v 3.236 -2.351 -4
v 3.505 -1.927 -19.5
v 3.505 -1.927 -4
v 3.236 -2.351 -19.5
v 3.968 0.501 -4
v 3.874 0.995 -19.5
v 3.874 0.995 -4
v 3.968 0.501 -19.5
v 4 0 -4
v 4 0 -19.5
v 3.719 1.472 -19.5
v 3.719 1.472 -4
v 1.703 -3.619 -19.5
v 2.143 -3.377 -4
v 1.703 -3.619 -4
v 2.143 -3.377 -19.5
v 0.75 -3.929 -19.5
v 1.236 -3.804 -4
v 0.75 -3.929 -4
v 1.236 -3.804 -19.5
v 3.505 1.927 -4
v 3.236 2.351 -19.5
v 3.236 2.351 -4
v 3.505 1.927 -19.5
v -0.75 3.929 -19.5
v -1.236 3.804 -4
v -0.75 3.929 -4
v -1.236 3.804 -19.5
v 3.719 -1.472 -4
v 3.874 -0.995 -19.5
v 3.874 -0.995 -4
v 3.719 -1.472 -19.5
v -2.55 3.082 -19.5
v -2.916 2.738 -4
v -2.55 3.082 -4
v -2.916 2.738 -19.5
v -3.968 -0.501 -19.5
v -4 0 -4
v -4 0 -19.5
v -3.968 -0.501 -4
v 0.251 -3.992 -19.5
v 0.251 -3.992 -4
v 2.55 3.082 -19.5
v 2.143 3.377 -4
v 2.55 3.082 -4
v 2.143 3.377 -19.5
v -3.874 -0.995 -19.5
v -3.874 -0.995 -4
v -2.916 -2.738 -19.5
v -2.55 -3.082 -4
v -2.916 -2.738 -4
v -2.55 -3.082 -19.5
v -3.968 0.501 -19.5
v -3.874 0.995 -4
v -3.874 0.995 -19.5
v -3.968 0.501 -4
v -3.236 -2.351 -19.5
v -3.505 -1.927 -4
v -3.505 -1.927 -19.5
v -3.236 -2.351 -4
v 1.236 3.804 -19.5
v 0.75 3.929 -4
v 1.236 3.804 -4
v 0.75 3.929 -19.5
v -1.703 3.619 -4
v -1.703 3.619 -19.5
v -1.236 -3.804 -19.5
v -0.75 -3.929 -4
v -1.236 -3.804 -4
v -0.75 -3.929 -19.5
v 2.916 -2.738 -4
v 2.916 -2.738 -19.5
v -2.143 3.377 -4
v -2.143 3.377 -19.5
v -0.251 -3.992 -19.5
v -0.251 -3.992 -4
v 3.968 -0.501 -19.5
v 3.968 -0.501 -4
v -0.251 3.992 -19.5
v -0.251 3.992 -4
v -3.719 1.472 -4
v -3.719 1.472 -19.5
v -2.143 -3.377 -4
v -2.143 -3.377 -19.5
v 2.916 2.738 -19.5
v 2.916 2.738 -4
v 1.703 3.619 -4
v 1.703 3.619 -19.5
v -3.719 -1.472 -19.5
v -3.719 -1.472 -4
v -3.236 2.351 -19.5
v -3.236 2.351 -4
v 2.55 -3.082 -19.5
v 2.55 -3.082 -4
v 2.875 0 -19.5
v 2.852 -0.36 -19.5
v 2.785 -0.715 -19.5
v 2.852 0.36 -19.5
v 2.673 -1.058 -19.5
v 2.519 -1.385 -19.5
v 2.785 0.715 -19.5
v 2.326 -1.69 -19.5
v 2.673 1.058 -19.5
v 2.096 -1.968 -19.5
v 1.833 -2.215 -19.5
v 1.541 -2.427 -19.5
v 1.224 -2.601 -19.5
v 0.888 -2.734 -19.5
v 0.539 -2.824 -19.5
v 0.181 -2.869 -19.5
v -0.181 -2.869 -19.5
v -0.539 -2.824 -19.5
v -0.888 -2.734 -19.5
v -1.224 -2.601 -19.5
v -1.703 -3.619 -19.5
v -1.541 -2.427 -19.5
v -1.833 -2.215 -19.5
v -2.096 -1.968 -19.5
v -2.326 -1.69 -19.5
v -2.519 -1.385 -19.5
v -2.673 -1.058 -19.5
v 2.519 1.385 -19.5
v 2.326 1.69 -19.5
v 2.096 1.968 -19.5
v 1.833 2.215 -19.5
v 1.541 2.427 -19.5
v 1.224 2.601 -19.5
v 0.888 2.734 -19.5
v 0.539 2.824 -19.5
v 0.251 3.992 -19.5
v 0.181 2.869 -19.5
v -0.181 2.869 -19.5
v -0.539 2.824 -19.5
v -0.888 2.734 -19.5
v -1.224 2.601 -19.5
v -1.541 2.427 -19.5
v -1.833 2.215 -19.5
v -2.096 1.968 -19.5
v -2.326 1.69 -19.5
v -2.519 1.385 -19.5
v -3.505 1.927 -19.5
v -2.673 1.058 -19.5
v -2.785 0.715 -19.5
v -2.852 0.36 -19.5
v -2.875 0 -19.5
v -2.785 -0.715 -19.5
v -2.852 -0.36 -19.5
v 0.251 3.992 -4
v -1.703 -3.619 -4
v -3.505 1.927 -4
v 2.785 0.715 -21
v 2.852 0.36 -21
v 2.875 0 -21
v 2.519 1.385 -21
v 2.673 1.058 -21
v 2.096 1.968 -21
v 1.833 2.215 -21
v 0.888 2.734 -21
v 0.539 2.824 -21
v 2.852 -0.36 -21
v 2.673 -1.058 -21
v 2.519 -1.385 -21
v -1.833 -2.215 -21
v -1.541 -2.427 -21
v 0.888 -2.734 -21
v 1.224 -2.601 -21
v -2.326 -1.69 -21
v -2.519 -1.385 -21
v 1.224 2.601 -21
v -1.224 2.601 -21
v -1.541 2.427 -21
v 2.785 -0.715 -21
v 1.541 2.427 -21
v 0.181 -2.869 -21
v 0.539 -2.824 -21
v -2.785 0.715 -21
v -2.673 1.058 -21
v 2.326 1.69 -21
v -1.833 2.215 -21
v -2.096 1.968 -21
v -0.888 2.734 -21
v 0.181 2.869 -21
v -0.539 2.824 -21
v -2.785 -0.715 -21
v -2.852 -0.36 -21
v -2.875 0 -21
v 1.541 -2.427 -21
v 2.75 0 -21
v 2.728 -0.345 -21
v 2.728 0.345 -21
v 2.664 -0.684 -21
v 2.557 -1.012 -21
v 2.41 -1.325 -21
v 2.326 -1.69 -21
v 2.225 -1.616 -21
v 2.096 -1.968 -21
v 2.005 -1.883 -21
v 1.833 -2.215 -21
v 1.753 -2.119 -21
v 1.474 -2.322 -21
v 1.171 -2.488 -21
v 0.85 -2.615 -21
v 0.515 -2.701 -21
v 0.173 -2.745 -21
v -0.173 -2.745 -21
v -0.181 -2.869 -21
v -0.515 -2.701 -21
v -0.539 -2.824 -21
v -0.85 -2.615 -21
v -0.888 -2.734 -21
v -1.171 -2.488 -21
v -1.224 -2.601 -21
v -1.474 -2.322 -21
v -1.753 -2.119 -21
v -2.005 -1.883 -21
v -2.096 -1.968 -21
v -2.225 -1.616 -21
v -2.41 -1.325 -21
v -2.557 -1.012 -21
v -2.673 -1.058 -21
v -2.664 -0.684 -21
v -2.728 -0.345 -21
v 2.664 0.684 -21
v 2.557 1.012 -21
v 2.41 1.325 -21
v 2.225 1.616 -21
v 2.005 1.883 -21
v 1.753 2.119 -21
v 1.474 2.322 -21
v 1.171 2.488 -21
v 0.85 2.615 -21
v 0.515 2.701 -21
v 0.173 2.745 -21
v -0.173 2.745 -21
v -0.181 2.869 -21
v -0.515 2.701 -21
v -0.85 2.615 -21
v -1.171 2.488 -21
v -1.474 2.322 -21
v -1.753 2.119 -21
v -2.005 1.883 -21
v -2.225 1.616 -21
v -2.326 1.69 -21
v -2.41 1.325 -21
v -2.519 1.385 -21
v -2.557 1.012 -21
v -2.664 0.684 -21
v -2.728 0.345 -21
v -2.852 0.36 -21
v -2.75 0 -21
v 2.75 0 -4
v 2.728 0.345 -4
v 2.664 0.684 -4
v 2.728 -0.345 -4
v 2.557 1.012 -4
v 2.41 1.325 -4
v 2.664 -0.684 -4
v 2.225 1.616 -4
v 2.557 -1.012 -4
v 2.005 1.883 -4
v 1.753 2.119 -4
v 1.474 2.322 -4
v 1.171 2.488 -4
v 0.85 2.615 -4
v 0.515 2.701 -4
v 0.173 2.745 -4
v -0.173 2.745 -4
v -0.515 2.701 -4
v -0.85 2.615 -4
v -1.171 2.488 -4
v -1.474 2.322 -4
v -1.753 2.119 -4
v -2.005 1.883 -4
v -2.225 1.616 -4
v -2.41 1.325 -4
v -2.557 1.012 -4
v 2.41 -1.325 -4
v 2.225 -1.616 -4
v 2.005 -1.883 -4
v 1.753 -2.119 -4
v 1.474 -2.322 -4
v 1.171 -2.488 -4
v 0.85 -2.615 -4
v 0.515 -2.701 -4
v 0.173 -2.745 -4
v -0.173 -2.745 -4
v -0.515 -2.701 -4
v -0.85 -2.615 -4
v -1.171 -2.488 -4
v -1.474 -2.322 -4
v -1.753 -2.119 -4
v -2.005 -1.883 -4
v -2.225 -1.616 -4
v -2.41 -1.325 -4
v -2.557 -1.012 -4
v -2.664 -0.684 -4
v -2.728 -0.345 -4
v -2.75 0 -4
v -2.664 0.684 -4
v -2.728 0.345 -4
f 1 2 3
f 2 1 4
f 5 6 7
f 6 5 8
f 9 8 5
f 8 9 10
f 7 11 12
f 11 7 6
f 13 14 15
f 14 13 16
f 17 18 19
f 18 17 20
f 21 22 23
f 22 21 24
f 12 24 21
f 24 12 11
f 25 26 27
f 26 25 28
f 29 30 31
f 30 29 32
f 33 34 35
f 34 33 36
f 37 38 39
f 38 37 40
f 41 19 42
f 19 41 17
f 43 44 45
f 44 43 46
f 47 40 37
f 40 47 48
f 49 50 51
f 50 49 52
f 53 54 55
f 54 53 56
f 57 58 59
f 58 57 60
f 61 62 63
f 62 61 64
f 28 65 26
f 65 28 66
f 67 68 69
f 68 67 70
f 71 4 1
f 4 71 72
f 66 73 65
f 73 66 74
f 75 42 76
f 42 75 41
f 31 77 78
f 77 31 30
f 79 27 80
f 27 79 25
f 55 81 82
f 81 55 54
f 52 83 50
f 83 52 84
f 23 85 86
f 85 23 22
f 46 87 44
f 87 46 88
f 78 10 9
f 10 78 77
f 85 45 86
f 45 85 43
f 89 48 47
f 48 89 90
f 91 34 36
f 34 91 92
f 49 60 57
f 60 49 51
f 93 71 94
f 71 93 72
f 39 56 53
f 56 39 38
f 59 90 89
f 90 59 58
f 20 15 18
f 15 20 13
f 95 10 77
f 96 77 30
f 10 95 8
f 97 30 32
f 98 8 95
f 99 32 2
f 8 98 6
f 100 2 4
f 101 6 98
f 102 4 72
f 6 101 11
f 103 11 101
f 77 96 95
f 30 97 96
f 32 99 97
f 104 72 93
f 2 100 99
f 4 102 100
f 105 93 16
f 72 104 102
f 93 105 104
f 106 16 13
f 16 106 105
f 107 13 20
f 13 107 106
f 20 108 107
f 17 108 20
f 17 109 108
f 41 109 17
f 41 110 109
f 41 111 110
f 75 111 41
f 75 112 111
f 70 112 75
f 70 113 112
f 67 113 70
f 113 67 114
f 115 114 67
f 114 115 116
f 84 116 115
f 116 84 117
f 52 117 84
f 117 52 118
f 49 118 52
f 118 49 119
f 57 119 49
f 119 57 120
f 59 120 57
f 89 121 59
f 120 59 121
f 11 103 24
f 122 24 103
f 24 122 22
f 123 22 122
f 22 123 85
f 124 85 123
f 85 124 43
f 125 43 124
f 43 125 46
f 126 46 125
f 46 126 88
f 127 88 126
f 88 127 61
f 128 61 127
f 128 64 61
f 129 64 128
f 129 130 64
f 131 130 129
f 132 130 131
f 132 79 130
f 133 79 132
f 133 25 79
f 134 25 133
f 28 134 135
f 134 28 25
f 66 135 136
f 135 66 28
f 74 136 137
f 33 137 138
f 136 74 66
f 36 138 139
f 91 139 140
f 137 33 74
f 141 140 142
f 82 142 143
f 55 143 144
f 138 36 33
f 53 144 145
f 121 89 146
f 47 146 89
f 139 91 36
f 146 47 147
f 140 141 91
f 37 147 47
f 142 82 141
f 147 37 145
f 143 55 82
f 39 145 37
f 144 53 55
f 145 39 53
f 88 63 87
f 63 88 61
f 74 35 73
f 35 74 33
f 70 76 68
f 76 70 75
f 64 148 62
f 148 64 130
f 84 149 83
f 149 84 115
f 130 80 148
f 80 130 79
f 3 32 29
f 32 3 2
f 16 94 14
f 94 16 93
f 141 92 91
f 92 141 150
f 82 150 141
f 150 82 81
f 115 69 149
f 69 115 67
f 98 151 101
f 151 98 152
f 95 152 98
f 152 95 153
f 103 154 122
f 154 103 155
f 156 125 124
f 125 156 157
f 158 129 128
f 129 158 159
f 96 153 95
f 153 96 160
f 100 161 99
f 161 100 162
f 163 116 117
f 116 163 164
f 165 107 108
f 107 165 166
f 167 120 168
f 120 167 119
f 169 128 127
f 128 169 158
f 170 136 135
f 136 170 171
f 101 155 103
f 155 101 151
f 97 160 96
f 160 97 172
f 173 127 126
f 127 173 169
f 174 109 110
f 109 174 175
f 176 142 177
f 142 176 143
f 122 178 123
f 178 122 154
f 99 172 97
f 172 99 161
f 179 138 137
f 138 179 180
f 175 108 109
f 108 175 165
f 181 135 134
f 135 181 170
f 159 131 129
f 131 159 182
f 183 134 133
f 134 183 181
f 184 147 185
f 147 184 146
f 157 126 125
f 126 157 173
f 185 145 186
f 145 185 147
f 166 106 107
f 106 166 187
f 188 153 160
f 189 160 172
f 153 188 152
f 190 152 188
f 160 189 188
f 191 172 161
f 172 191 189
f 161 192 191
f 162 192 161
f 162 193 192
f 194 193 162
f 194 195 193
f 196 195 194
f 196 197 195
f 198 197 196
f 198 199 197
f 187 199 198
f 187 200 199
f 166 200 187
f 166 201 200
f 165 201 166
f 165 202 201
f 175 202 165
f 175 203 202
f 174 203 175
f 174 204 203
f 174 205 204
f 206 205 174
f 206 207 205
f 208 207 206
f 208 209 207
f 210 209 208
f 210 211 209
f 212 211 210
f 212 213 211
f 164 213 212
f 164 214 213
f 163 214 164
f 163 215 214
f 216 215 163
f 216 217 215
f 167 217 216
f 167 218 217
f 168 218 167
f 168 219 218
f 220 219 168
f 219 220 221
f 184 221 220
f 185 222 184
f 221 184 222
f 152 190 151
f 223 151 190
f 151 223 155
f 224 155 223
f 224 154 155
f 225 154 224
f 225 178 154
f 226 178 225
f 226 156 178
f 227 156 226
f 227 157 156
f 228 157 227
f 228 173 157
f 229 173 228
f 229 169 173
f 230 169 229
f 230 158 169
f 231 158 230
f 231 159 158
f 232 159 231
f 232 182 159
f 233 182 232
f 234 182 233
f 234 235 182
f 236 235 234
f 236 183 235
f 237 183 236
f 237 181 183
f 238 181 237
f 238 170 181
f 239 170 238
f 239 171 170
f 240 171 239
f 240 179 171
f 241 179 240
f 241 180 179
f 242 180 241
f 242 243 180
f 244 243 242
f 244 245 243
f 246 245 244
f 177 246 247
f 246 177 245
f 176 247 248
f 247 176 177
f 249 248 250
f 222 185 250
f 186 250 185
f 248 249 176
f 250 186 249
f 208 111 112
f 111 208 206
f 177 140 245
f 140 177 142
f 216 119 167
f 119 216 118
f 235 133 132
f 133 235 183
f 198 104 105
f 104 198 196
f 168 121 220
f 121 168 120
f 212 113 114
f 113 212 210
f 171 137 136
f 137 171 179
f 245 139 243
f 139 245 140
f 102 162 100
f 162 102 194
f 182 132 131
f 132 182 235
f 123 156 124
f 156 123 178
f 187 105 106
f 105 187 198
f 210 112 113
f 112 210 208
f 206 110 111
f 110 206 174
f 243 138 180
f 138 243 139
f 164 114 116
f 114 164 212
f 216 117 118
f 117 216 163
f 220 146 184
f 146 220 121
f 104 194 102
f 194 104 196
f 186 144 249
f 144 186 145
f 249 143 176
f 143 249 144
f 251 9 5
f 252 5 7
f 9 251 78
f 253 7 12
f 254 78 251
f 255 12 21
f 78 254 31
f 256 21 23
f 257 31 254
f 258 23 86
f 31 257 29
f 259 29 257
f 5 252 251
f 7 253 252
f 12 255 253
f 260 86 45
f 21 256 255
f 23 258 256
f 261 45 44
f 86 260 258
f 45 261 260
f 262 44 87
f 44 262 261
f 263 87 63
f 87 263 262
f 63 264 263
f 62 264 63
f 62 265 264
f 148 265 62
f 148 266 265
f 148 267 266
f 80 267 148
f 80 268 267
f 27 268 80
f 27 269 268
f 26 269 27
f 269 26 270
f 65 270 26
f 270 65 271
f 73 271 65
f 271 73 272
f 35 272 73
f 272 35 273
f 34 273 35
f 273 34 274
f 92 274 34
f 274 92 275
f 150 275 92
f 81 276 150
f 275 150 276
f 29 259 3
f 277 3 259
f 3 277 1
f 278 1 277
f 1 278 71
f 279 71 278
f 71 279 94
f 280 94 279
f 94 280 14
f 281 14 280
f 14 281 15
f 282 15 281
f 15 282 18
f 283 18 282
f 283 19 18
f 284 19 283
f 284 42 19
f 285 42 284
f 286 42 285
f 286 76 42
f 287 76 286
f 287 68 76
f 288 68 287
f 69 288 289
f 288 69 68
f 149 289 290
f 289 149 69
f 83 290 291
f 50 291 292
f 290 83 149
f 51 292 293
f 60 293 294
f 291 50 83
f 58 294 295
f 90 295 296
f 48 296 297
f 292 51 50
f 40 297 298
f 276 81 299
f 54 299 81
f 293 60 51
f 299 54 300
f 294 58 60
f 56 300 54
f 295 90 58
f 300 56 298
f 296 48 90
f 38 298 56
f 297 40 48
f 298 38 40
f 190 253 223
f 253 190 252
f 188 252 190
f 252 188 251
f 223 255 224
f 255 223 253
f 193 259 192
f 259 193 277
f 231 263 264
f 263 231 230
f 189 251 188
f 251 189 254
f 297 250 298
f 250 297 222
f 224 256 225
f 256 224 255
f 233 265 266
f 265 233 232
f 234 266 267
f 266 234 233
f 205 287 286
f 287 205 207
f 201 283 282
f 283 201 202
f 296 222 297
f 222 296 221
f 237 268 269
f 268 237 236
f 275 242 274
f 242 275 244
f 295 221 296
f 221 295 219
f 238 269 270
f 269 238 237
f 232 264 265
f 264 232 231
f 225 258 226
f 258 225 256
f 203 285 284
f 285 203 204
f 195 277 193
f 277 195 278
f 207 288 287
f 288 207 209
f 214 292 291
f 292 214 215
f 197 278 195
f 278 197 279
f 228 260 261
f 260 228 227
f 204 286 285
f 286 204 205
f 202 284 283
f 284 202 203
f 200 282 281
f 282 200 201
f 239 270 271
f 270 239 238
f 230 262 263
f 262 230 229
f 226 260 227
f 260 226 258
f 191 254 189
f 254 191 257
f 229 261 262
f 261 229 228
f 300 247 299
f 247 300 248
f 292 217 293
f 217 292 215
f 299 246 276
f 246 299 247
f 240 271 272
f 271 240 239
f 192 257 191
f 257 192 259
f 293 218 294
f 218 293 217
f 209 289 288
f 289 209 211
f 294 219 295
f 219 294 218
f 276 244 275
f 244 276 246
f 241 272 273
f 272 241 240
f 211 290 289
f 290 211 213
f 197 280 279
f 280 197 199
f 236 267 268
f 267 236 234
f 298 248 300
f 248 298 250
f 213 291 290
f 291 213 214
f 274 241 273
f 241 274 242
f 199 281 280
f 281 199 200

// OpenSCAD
$fn = 50;

difference() {
	union() {
		translate(v = [0, 0, -19.5]) {
			cylinder(h = 22.5, r = 4.0);
		}
		#translate(v = [0, 0, -21.0]) {
			cylinder(h = 21, r = 2.875);
		}
	}
	union() {
		translate(v = [0, 0, 0]) {
			rotate(a = [0, 0, 0]) {
				difference() {
					union() {
						translate(v = [0, 0, -4]) {
							linear_extrude(height = 4) {
								polygon(points = [[4.8468, 0.0], [2.4234000000000004, 4.197451927062417], [-2.423399999999999, 4.197451927062417], [-4.8468, 5.935618106107392e-16], [-2.423400000000002, -4.197451927062416], [2.423399999999997, -4.197451927062419]]);
							}
						}
					}
					union();
				}
			}
		}
		#cylinder(h = 3, r = 6.25);
		#translate(v = [0, 0, -100.0]) {
			cylinder(h = 200, r = 2.75);
		}
	}
}
